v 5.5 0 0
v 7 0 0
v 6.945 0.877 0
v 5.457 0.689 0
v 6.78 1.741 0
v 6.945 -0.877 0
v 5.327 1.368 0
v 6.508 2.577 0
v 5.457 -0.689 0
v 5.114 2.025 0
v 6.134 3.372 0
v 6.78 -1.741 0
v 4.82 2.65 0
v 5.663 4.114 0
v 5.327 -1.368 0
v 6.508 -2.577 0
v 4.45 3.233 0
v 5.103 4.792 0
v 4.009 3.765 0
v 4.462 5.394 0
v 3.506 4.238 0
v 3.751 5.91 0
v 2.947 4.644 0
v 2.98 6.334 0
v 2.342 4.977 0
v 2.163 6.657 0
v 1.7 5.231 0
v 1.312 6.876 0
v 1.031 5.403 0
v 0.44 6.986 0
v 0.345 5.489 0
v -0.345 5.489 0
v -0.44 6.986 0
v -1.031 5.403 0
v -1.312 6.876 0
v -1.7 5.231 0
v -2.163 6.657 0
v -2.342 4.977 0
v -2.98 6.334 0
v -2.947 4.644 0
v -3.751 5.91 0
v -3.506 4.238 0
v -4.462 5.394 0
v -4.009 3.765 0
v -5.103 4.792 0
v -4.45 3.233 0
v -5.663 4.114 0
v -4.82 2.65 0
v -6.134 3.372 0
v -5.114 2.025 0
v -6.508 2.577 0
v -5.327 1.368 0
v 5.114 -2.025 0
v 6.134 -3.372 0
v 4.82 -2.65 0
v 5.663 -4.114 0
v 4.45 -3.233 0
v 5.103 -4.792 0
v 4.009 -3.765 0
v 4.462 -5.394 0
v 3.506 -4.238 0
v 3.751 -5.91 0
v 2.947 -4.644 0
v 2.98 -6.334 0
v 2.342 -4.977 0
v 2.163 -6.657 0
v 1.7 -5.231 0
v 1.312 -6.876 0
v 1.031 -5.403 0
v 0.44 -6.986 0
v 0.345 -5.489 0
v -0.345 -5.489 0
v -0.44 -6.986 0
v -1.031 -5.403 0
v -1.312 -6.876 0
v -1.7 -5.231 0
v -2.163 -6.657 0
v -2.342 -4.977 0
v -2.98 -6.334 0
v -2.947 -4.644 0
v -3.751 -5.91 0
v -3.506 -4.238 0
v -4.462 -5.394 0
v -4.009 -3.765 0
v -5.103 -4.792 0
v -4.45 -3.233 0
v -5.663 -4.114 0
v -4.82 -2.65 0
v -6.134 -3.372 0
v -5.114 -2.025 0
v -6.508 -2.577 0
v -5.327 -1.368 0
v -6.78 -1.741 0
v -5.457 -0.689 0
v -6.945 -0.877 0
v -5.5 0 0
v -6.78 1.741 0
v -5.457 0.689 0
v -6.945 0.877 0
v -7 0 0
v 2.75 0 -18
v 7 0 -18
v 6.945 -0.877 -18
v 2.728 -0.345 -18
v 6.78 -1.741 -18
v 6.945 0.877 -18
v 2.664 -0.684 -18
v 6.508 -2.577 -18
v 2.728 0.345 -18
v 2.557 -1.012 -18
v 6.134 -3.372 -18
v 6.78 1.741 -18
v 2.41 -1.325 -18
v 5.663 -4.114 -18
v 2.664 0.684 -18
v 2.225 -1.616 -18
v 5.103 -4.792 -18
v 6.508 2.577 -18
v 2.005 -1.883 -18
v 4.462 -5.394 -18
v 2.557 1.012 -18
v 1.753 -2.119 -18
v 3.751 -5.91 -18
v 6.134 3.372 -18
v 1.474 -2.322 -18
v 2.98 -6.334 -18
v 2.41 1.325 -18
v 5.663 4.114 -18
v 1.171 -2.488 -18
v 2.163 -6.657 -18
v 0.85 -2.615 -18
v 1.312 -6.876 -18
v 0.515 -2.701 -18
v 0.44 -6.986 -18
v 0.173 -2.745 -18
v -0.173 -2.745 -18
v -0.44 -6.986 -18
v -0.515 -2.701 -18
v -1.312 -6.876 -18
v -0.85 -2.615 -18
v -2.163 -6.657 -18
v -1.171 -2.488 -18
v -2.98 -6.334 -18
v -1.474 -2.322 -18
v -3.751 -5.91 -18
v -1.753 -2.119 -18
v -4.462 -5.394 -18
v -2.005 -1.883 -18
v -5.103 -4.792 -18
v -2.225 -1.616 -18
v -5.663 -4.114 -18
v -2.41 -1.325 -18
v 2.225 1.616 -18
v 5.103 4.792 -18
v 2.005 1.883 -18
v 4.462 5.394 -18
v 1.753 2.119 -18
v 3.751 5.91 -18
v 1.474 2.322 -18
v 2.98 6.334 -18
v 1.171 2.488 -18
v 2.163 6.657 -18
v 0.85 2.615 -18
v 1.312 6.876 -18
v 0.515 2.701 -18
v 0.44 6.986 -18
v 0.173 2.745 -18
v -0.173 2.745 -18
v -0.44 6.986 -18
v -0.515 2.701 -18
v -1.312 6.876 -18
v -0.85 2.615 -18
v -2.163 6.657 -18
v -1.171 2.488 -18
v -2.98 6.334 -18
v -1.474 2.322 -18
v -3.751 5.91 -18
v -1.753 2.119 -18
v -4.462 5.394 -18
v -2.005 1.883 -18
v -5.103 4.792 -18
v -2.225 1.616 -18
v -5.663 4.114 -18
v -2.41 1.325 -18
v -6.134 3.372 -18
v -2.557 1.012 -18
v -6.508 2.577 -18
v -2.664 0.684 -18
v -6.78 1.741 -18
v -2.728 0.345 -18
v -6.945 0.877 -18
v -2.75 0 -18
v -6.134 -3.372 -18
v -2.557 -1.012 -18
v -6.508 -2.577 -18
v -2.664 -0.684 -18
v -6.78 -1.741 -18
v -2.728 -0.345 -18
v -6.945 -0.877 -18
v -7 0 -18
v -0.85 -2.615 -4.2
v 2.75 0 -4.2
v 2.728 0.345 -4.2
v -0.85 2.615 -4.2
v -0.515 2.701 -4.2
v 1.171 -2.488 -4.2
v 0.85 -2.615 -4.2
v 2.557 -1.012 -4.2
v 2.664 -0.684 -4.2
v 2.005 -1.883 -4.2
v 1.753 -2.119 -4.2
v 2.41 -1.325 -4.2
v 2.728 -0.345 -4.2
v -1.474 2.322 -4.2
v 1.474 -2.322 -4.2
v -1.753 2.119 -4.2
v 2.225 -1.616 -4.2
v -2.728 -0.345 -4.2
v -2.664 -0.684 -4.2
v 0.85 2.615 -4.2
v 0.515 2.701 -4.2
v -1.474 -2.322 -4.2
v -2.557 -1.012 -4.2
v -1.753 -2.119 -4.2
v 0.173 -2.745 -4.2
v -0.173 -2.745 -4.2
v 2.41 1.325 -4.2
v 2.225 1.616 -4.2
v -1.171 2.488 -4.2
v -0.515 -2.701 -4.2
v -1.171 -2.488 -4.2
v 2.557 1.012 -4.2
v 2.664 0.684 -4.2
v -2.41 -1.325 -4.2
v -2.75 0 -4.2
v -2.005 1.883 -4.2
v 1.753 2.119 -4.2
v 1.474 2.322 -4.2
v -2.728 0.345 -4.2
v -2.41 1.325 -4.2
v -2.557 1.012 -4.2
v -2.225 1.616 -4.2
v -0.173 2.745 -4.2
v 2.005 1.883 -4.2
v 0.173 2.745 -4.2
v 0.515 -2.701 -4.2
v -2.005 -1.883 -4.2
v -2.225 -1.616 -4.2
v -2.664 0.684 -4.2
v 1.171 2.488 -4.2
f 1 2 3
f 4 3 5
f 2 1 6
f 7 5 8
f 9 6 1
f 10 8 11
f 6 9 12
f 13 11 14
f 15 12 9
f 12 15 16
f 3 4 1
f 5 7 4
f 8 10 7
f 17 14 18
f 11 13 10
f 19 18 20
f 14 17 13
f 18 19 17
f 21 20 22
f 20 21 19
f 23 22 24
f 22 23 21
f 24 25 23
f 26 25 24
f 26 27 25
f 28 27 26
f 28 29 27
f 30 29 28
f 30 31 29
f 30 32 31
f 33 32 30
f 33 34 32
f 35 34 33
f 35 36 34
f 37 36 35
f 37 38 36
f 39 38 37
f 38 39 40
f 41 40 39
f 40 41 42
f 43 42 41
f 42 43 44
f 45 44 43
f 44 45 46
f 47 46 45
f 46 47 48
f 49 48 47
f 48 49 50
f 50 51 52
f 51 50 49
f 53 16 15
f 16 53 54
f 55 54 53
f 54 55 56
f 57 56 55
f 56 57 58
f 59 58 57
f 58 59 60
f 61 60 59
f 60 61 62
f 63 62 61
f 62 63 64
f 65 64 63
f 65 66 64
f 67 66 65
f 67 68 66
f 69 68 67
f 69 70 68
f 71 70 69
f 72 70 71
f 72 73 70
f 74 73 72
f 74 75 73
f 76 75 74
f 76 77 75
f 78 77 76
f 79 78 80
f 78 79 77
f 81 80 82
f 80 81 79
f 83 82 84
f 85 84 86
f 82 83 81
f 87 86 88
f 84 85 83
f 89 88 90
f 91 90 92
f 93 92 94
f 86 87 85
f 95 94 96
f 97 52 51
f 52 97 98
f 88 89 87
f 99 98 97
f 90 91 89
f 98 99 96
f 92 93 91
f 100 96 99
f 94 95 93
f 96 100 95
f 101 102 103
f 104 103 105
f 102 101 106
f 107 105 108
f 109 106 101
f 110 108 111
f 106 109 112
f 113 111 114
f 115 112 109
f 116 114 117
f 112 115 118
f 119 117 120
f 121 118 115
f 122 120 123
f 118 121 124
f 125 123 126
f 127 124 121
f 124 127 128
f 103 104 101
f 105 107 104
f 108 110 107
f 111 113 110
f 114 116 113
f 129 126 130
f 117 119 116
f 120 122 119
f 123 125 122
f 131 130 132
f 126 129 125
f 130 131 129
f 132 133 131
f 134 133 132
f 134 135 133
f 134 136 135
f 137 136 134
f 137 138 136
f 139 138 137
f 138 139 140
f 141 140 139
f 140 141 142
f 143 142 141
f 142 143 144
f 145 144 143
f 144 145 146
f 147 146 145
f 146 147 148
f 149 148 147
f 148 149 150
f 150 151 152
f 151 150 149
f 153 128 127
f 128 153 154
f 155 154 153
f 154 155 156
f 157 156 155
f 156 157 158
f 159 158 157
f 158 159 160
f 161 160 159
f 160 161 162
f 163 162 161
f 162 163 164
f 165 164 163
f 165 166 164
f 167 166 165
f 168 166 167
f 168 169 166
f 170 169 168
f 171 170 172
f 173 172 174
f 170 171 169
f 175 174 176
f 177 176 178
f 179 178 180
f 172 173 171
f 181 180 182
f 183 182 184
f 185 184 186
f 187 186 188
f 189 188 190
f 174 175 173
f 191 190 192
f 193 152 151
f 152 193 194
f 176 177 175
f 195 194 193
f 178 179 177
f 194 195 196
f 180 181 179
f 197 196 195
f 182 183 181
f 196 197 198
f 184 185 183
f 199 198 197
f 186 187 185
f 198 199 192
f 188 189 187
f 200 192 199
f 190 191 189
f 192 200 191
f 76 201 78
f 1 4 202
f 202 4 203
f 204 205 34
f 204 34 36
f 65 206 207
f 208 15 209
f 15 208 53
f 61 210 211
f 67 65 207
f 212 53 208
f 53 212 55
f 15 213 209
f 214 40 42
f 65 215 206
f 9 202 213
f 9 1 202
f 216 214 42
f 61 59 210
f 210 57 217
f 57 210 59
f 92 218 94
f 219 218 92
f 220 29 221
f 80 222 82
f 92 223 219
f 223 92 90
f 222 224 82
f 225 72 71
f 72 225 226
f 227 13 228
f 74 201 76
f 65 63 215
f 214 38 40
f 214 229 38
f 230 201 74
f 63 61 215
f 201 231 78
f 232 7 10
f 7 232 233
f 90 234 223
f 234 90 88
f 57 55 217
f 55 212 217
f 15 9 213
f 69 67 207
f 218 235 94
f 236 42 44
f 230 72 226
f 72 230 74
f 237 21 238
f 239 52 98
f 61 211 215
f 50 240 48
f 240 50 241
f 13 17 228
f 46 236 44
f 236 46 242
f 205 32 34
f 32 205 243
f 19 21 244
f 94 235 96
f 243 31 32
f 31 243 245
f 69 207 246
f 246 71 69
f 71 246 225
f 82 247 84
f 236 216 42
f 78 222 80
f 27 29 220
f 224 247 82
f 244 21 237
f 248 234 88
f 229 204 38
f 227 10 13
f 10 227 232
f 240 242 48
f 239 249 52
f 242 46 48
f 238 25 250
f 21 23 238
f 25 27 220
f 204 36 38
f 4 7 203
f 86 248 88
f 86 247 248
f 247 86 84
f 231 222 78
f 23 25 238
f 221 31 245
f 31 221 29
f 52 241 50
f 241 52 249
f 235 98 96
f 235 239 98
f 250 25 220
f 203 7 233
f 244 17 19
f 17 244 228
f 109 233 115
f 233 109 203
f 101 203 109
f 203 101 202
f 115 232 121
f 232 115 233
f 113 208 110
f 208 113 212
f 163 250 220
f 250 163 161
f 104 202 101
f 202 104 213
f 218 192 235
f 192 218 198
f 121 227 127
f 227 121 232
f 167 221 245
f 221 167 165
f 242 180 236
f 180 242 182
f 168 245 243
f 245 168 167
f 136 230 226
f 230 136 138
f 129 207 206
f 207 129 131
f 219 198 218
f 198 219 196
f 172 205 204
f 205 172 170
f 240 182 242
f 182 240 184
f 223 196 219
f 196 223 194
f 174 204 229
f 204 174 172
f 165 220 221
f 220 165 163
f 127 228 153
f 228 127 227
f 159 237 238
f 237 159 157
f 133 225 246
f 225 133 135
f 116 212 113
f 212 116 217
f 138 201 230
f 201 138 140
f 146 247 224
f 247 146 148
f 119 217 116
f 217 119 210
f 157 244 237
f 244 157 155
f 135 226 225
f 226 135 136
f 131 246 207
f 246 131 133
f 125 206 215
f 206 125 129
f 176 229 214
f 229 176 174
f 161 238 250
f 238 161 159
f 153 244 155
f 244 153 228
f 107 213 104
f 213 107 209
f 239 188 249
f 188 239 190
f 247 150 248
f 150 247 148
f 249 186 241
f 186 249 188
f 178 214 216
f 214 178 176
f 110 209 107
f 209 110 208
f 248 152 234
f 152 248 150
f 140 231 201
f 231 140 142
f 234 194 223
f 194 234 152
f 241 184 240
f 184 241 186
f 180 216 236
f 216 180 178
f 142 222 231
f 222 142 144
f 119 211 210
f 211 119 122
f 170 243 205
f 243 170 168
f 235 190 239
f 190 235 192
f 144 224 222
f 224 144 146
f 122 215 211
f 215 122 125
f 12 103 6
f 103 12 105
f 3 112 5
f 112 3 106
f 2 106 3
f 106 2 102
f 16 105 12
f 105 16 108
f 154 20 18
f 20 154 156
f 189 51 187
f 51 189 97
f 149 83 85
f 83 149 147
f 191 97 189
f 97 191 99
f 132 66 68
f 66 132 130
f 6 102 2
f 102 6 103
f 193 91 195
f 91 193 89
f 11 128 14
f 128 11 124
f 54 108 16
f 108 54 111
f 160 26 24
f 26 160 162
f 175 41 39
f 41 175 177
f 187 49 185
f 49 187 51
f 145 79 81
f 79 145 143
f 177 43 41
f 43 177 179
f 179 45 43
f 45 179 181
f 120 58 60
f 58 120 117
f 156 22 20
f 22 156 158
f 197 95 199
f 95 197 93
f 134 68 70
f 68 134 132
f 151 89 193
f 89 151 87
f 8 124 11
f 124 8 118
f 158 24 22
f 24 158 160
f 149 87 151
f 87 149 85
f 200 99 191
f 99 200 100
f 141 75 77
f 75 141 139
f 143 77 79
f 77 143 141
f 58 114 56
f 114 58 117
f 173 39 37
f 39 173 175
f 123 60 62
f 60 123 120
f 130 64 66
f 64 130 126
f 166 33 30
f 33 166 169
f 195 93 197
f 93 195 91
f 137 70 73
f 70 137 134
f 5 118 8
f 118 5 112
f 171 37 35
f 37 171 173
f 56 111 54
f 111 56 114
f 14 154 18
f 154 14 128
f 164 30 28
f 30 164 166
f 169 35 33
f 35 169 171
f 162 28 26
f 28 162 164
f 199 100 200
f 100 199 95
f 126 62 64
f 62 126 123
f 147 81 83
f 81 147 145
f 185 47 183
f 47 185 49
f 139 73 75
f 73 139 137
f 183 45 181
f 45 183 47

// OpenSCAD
$fn = 50;


difference() {
	union() {
		translate(v = [0, 0, -18.0000000000]) {
			cylinder(h = 18, r = 7.0000000000);
		}
	}
	union() {
		translate(v = [0, 0, 0]) {
			rotate(a = [0, 0, 0]) {
				difference() {
					union() {
						#translate(v = [0, 0, -18.0000000000]) {
							cylinder(h = 18, r = 2.2500000000);
						}
						#translate(v = [0, 0, -4.2000000000]) {
							cylinder(h = 4.2000000000, r = 7.0000000000, r1 = 2.7500000000, r2 = 5.5000000000);
						}
						#translate(v = [0, 0, -18.0000000000]) {
							cylinder(h = 18, r = 2.7500000000);
						}
						#translate(v = [0, 0, -18.0000000000]) {
							cylinder(h = 18, r = 2.2500000000);
						}
					}
					union();
				}
			}
		}
	}
}
